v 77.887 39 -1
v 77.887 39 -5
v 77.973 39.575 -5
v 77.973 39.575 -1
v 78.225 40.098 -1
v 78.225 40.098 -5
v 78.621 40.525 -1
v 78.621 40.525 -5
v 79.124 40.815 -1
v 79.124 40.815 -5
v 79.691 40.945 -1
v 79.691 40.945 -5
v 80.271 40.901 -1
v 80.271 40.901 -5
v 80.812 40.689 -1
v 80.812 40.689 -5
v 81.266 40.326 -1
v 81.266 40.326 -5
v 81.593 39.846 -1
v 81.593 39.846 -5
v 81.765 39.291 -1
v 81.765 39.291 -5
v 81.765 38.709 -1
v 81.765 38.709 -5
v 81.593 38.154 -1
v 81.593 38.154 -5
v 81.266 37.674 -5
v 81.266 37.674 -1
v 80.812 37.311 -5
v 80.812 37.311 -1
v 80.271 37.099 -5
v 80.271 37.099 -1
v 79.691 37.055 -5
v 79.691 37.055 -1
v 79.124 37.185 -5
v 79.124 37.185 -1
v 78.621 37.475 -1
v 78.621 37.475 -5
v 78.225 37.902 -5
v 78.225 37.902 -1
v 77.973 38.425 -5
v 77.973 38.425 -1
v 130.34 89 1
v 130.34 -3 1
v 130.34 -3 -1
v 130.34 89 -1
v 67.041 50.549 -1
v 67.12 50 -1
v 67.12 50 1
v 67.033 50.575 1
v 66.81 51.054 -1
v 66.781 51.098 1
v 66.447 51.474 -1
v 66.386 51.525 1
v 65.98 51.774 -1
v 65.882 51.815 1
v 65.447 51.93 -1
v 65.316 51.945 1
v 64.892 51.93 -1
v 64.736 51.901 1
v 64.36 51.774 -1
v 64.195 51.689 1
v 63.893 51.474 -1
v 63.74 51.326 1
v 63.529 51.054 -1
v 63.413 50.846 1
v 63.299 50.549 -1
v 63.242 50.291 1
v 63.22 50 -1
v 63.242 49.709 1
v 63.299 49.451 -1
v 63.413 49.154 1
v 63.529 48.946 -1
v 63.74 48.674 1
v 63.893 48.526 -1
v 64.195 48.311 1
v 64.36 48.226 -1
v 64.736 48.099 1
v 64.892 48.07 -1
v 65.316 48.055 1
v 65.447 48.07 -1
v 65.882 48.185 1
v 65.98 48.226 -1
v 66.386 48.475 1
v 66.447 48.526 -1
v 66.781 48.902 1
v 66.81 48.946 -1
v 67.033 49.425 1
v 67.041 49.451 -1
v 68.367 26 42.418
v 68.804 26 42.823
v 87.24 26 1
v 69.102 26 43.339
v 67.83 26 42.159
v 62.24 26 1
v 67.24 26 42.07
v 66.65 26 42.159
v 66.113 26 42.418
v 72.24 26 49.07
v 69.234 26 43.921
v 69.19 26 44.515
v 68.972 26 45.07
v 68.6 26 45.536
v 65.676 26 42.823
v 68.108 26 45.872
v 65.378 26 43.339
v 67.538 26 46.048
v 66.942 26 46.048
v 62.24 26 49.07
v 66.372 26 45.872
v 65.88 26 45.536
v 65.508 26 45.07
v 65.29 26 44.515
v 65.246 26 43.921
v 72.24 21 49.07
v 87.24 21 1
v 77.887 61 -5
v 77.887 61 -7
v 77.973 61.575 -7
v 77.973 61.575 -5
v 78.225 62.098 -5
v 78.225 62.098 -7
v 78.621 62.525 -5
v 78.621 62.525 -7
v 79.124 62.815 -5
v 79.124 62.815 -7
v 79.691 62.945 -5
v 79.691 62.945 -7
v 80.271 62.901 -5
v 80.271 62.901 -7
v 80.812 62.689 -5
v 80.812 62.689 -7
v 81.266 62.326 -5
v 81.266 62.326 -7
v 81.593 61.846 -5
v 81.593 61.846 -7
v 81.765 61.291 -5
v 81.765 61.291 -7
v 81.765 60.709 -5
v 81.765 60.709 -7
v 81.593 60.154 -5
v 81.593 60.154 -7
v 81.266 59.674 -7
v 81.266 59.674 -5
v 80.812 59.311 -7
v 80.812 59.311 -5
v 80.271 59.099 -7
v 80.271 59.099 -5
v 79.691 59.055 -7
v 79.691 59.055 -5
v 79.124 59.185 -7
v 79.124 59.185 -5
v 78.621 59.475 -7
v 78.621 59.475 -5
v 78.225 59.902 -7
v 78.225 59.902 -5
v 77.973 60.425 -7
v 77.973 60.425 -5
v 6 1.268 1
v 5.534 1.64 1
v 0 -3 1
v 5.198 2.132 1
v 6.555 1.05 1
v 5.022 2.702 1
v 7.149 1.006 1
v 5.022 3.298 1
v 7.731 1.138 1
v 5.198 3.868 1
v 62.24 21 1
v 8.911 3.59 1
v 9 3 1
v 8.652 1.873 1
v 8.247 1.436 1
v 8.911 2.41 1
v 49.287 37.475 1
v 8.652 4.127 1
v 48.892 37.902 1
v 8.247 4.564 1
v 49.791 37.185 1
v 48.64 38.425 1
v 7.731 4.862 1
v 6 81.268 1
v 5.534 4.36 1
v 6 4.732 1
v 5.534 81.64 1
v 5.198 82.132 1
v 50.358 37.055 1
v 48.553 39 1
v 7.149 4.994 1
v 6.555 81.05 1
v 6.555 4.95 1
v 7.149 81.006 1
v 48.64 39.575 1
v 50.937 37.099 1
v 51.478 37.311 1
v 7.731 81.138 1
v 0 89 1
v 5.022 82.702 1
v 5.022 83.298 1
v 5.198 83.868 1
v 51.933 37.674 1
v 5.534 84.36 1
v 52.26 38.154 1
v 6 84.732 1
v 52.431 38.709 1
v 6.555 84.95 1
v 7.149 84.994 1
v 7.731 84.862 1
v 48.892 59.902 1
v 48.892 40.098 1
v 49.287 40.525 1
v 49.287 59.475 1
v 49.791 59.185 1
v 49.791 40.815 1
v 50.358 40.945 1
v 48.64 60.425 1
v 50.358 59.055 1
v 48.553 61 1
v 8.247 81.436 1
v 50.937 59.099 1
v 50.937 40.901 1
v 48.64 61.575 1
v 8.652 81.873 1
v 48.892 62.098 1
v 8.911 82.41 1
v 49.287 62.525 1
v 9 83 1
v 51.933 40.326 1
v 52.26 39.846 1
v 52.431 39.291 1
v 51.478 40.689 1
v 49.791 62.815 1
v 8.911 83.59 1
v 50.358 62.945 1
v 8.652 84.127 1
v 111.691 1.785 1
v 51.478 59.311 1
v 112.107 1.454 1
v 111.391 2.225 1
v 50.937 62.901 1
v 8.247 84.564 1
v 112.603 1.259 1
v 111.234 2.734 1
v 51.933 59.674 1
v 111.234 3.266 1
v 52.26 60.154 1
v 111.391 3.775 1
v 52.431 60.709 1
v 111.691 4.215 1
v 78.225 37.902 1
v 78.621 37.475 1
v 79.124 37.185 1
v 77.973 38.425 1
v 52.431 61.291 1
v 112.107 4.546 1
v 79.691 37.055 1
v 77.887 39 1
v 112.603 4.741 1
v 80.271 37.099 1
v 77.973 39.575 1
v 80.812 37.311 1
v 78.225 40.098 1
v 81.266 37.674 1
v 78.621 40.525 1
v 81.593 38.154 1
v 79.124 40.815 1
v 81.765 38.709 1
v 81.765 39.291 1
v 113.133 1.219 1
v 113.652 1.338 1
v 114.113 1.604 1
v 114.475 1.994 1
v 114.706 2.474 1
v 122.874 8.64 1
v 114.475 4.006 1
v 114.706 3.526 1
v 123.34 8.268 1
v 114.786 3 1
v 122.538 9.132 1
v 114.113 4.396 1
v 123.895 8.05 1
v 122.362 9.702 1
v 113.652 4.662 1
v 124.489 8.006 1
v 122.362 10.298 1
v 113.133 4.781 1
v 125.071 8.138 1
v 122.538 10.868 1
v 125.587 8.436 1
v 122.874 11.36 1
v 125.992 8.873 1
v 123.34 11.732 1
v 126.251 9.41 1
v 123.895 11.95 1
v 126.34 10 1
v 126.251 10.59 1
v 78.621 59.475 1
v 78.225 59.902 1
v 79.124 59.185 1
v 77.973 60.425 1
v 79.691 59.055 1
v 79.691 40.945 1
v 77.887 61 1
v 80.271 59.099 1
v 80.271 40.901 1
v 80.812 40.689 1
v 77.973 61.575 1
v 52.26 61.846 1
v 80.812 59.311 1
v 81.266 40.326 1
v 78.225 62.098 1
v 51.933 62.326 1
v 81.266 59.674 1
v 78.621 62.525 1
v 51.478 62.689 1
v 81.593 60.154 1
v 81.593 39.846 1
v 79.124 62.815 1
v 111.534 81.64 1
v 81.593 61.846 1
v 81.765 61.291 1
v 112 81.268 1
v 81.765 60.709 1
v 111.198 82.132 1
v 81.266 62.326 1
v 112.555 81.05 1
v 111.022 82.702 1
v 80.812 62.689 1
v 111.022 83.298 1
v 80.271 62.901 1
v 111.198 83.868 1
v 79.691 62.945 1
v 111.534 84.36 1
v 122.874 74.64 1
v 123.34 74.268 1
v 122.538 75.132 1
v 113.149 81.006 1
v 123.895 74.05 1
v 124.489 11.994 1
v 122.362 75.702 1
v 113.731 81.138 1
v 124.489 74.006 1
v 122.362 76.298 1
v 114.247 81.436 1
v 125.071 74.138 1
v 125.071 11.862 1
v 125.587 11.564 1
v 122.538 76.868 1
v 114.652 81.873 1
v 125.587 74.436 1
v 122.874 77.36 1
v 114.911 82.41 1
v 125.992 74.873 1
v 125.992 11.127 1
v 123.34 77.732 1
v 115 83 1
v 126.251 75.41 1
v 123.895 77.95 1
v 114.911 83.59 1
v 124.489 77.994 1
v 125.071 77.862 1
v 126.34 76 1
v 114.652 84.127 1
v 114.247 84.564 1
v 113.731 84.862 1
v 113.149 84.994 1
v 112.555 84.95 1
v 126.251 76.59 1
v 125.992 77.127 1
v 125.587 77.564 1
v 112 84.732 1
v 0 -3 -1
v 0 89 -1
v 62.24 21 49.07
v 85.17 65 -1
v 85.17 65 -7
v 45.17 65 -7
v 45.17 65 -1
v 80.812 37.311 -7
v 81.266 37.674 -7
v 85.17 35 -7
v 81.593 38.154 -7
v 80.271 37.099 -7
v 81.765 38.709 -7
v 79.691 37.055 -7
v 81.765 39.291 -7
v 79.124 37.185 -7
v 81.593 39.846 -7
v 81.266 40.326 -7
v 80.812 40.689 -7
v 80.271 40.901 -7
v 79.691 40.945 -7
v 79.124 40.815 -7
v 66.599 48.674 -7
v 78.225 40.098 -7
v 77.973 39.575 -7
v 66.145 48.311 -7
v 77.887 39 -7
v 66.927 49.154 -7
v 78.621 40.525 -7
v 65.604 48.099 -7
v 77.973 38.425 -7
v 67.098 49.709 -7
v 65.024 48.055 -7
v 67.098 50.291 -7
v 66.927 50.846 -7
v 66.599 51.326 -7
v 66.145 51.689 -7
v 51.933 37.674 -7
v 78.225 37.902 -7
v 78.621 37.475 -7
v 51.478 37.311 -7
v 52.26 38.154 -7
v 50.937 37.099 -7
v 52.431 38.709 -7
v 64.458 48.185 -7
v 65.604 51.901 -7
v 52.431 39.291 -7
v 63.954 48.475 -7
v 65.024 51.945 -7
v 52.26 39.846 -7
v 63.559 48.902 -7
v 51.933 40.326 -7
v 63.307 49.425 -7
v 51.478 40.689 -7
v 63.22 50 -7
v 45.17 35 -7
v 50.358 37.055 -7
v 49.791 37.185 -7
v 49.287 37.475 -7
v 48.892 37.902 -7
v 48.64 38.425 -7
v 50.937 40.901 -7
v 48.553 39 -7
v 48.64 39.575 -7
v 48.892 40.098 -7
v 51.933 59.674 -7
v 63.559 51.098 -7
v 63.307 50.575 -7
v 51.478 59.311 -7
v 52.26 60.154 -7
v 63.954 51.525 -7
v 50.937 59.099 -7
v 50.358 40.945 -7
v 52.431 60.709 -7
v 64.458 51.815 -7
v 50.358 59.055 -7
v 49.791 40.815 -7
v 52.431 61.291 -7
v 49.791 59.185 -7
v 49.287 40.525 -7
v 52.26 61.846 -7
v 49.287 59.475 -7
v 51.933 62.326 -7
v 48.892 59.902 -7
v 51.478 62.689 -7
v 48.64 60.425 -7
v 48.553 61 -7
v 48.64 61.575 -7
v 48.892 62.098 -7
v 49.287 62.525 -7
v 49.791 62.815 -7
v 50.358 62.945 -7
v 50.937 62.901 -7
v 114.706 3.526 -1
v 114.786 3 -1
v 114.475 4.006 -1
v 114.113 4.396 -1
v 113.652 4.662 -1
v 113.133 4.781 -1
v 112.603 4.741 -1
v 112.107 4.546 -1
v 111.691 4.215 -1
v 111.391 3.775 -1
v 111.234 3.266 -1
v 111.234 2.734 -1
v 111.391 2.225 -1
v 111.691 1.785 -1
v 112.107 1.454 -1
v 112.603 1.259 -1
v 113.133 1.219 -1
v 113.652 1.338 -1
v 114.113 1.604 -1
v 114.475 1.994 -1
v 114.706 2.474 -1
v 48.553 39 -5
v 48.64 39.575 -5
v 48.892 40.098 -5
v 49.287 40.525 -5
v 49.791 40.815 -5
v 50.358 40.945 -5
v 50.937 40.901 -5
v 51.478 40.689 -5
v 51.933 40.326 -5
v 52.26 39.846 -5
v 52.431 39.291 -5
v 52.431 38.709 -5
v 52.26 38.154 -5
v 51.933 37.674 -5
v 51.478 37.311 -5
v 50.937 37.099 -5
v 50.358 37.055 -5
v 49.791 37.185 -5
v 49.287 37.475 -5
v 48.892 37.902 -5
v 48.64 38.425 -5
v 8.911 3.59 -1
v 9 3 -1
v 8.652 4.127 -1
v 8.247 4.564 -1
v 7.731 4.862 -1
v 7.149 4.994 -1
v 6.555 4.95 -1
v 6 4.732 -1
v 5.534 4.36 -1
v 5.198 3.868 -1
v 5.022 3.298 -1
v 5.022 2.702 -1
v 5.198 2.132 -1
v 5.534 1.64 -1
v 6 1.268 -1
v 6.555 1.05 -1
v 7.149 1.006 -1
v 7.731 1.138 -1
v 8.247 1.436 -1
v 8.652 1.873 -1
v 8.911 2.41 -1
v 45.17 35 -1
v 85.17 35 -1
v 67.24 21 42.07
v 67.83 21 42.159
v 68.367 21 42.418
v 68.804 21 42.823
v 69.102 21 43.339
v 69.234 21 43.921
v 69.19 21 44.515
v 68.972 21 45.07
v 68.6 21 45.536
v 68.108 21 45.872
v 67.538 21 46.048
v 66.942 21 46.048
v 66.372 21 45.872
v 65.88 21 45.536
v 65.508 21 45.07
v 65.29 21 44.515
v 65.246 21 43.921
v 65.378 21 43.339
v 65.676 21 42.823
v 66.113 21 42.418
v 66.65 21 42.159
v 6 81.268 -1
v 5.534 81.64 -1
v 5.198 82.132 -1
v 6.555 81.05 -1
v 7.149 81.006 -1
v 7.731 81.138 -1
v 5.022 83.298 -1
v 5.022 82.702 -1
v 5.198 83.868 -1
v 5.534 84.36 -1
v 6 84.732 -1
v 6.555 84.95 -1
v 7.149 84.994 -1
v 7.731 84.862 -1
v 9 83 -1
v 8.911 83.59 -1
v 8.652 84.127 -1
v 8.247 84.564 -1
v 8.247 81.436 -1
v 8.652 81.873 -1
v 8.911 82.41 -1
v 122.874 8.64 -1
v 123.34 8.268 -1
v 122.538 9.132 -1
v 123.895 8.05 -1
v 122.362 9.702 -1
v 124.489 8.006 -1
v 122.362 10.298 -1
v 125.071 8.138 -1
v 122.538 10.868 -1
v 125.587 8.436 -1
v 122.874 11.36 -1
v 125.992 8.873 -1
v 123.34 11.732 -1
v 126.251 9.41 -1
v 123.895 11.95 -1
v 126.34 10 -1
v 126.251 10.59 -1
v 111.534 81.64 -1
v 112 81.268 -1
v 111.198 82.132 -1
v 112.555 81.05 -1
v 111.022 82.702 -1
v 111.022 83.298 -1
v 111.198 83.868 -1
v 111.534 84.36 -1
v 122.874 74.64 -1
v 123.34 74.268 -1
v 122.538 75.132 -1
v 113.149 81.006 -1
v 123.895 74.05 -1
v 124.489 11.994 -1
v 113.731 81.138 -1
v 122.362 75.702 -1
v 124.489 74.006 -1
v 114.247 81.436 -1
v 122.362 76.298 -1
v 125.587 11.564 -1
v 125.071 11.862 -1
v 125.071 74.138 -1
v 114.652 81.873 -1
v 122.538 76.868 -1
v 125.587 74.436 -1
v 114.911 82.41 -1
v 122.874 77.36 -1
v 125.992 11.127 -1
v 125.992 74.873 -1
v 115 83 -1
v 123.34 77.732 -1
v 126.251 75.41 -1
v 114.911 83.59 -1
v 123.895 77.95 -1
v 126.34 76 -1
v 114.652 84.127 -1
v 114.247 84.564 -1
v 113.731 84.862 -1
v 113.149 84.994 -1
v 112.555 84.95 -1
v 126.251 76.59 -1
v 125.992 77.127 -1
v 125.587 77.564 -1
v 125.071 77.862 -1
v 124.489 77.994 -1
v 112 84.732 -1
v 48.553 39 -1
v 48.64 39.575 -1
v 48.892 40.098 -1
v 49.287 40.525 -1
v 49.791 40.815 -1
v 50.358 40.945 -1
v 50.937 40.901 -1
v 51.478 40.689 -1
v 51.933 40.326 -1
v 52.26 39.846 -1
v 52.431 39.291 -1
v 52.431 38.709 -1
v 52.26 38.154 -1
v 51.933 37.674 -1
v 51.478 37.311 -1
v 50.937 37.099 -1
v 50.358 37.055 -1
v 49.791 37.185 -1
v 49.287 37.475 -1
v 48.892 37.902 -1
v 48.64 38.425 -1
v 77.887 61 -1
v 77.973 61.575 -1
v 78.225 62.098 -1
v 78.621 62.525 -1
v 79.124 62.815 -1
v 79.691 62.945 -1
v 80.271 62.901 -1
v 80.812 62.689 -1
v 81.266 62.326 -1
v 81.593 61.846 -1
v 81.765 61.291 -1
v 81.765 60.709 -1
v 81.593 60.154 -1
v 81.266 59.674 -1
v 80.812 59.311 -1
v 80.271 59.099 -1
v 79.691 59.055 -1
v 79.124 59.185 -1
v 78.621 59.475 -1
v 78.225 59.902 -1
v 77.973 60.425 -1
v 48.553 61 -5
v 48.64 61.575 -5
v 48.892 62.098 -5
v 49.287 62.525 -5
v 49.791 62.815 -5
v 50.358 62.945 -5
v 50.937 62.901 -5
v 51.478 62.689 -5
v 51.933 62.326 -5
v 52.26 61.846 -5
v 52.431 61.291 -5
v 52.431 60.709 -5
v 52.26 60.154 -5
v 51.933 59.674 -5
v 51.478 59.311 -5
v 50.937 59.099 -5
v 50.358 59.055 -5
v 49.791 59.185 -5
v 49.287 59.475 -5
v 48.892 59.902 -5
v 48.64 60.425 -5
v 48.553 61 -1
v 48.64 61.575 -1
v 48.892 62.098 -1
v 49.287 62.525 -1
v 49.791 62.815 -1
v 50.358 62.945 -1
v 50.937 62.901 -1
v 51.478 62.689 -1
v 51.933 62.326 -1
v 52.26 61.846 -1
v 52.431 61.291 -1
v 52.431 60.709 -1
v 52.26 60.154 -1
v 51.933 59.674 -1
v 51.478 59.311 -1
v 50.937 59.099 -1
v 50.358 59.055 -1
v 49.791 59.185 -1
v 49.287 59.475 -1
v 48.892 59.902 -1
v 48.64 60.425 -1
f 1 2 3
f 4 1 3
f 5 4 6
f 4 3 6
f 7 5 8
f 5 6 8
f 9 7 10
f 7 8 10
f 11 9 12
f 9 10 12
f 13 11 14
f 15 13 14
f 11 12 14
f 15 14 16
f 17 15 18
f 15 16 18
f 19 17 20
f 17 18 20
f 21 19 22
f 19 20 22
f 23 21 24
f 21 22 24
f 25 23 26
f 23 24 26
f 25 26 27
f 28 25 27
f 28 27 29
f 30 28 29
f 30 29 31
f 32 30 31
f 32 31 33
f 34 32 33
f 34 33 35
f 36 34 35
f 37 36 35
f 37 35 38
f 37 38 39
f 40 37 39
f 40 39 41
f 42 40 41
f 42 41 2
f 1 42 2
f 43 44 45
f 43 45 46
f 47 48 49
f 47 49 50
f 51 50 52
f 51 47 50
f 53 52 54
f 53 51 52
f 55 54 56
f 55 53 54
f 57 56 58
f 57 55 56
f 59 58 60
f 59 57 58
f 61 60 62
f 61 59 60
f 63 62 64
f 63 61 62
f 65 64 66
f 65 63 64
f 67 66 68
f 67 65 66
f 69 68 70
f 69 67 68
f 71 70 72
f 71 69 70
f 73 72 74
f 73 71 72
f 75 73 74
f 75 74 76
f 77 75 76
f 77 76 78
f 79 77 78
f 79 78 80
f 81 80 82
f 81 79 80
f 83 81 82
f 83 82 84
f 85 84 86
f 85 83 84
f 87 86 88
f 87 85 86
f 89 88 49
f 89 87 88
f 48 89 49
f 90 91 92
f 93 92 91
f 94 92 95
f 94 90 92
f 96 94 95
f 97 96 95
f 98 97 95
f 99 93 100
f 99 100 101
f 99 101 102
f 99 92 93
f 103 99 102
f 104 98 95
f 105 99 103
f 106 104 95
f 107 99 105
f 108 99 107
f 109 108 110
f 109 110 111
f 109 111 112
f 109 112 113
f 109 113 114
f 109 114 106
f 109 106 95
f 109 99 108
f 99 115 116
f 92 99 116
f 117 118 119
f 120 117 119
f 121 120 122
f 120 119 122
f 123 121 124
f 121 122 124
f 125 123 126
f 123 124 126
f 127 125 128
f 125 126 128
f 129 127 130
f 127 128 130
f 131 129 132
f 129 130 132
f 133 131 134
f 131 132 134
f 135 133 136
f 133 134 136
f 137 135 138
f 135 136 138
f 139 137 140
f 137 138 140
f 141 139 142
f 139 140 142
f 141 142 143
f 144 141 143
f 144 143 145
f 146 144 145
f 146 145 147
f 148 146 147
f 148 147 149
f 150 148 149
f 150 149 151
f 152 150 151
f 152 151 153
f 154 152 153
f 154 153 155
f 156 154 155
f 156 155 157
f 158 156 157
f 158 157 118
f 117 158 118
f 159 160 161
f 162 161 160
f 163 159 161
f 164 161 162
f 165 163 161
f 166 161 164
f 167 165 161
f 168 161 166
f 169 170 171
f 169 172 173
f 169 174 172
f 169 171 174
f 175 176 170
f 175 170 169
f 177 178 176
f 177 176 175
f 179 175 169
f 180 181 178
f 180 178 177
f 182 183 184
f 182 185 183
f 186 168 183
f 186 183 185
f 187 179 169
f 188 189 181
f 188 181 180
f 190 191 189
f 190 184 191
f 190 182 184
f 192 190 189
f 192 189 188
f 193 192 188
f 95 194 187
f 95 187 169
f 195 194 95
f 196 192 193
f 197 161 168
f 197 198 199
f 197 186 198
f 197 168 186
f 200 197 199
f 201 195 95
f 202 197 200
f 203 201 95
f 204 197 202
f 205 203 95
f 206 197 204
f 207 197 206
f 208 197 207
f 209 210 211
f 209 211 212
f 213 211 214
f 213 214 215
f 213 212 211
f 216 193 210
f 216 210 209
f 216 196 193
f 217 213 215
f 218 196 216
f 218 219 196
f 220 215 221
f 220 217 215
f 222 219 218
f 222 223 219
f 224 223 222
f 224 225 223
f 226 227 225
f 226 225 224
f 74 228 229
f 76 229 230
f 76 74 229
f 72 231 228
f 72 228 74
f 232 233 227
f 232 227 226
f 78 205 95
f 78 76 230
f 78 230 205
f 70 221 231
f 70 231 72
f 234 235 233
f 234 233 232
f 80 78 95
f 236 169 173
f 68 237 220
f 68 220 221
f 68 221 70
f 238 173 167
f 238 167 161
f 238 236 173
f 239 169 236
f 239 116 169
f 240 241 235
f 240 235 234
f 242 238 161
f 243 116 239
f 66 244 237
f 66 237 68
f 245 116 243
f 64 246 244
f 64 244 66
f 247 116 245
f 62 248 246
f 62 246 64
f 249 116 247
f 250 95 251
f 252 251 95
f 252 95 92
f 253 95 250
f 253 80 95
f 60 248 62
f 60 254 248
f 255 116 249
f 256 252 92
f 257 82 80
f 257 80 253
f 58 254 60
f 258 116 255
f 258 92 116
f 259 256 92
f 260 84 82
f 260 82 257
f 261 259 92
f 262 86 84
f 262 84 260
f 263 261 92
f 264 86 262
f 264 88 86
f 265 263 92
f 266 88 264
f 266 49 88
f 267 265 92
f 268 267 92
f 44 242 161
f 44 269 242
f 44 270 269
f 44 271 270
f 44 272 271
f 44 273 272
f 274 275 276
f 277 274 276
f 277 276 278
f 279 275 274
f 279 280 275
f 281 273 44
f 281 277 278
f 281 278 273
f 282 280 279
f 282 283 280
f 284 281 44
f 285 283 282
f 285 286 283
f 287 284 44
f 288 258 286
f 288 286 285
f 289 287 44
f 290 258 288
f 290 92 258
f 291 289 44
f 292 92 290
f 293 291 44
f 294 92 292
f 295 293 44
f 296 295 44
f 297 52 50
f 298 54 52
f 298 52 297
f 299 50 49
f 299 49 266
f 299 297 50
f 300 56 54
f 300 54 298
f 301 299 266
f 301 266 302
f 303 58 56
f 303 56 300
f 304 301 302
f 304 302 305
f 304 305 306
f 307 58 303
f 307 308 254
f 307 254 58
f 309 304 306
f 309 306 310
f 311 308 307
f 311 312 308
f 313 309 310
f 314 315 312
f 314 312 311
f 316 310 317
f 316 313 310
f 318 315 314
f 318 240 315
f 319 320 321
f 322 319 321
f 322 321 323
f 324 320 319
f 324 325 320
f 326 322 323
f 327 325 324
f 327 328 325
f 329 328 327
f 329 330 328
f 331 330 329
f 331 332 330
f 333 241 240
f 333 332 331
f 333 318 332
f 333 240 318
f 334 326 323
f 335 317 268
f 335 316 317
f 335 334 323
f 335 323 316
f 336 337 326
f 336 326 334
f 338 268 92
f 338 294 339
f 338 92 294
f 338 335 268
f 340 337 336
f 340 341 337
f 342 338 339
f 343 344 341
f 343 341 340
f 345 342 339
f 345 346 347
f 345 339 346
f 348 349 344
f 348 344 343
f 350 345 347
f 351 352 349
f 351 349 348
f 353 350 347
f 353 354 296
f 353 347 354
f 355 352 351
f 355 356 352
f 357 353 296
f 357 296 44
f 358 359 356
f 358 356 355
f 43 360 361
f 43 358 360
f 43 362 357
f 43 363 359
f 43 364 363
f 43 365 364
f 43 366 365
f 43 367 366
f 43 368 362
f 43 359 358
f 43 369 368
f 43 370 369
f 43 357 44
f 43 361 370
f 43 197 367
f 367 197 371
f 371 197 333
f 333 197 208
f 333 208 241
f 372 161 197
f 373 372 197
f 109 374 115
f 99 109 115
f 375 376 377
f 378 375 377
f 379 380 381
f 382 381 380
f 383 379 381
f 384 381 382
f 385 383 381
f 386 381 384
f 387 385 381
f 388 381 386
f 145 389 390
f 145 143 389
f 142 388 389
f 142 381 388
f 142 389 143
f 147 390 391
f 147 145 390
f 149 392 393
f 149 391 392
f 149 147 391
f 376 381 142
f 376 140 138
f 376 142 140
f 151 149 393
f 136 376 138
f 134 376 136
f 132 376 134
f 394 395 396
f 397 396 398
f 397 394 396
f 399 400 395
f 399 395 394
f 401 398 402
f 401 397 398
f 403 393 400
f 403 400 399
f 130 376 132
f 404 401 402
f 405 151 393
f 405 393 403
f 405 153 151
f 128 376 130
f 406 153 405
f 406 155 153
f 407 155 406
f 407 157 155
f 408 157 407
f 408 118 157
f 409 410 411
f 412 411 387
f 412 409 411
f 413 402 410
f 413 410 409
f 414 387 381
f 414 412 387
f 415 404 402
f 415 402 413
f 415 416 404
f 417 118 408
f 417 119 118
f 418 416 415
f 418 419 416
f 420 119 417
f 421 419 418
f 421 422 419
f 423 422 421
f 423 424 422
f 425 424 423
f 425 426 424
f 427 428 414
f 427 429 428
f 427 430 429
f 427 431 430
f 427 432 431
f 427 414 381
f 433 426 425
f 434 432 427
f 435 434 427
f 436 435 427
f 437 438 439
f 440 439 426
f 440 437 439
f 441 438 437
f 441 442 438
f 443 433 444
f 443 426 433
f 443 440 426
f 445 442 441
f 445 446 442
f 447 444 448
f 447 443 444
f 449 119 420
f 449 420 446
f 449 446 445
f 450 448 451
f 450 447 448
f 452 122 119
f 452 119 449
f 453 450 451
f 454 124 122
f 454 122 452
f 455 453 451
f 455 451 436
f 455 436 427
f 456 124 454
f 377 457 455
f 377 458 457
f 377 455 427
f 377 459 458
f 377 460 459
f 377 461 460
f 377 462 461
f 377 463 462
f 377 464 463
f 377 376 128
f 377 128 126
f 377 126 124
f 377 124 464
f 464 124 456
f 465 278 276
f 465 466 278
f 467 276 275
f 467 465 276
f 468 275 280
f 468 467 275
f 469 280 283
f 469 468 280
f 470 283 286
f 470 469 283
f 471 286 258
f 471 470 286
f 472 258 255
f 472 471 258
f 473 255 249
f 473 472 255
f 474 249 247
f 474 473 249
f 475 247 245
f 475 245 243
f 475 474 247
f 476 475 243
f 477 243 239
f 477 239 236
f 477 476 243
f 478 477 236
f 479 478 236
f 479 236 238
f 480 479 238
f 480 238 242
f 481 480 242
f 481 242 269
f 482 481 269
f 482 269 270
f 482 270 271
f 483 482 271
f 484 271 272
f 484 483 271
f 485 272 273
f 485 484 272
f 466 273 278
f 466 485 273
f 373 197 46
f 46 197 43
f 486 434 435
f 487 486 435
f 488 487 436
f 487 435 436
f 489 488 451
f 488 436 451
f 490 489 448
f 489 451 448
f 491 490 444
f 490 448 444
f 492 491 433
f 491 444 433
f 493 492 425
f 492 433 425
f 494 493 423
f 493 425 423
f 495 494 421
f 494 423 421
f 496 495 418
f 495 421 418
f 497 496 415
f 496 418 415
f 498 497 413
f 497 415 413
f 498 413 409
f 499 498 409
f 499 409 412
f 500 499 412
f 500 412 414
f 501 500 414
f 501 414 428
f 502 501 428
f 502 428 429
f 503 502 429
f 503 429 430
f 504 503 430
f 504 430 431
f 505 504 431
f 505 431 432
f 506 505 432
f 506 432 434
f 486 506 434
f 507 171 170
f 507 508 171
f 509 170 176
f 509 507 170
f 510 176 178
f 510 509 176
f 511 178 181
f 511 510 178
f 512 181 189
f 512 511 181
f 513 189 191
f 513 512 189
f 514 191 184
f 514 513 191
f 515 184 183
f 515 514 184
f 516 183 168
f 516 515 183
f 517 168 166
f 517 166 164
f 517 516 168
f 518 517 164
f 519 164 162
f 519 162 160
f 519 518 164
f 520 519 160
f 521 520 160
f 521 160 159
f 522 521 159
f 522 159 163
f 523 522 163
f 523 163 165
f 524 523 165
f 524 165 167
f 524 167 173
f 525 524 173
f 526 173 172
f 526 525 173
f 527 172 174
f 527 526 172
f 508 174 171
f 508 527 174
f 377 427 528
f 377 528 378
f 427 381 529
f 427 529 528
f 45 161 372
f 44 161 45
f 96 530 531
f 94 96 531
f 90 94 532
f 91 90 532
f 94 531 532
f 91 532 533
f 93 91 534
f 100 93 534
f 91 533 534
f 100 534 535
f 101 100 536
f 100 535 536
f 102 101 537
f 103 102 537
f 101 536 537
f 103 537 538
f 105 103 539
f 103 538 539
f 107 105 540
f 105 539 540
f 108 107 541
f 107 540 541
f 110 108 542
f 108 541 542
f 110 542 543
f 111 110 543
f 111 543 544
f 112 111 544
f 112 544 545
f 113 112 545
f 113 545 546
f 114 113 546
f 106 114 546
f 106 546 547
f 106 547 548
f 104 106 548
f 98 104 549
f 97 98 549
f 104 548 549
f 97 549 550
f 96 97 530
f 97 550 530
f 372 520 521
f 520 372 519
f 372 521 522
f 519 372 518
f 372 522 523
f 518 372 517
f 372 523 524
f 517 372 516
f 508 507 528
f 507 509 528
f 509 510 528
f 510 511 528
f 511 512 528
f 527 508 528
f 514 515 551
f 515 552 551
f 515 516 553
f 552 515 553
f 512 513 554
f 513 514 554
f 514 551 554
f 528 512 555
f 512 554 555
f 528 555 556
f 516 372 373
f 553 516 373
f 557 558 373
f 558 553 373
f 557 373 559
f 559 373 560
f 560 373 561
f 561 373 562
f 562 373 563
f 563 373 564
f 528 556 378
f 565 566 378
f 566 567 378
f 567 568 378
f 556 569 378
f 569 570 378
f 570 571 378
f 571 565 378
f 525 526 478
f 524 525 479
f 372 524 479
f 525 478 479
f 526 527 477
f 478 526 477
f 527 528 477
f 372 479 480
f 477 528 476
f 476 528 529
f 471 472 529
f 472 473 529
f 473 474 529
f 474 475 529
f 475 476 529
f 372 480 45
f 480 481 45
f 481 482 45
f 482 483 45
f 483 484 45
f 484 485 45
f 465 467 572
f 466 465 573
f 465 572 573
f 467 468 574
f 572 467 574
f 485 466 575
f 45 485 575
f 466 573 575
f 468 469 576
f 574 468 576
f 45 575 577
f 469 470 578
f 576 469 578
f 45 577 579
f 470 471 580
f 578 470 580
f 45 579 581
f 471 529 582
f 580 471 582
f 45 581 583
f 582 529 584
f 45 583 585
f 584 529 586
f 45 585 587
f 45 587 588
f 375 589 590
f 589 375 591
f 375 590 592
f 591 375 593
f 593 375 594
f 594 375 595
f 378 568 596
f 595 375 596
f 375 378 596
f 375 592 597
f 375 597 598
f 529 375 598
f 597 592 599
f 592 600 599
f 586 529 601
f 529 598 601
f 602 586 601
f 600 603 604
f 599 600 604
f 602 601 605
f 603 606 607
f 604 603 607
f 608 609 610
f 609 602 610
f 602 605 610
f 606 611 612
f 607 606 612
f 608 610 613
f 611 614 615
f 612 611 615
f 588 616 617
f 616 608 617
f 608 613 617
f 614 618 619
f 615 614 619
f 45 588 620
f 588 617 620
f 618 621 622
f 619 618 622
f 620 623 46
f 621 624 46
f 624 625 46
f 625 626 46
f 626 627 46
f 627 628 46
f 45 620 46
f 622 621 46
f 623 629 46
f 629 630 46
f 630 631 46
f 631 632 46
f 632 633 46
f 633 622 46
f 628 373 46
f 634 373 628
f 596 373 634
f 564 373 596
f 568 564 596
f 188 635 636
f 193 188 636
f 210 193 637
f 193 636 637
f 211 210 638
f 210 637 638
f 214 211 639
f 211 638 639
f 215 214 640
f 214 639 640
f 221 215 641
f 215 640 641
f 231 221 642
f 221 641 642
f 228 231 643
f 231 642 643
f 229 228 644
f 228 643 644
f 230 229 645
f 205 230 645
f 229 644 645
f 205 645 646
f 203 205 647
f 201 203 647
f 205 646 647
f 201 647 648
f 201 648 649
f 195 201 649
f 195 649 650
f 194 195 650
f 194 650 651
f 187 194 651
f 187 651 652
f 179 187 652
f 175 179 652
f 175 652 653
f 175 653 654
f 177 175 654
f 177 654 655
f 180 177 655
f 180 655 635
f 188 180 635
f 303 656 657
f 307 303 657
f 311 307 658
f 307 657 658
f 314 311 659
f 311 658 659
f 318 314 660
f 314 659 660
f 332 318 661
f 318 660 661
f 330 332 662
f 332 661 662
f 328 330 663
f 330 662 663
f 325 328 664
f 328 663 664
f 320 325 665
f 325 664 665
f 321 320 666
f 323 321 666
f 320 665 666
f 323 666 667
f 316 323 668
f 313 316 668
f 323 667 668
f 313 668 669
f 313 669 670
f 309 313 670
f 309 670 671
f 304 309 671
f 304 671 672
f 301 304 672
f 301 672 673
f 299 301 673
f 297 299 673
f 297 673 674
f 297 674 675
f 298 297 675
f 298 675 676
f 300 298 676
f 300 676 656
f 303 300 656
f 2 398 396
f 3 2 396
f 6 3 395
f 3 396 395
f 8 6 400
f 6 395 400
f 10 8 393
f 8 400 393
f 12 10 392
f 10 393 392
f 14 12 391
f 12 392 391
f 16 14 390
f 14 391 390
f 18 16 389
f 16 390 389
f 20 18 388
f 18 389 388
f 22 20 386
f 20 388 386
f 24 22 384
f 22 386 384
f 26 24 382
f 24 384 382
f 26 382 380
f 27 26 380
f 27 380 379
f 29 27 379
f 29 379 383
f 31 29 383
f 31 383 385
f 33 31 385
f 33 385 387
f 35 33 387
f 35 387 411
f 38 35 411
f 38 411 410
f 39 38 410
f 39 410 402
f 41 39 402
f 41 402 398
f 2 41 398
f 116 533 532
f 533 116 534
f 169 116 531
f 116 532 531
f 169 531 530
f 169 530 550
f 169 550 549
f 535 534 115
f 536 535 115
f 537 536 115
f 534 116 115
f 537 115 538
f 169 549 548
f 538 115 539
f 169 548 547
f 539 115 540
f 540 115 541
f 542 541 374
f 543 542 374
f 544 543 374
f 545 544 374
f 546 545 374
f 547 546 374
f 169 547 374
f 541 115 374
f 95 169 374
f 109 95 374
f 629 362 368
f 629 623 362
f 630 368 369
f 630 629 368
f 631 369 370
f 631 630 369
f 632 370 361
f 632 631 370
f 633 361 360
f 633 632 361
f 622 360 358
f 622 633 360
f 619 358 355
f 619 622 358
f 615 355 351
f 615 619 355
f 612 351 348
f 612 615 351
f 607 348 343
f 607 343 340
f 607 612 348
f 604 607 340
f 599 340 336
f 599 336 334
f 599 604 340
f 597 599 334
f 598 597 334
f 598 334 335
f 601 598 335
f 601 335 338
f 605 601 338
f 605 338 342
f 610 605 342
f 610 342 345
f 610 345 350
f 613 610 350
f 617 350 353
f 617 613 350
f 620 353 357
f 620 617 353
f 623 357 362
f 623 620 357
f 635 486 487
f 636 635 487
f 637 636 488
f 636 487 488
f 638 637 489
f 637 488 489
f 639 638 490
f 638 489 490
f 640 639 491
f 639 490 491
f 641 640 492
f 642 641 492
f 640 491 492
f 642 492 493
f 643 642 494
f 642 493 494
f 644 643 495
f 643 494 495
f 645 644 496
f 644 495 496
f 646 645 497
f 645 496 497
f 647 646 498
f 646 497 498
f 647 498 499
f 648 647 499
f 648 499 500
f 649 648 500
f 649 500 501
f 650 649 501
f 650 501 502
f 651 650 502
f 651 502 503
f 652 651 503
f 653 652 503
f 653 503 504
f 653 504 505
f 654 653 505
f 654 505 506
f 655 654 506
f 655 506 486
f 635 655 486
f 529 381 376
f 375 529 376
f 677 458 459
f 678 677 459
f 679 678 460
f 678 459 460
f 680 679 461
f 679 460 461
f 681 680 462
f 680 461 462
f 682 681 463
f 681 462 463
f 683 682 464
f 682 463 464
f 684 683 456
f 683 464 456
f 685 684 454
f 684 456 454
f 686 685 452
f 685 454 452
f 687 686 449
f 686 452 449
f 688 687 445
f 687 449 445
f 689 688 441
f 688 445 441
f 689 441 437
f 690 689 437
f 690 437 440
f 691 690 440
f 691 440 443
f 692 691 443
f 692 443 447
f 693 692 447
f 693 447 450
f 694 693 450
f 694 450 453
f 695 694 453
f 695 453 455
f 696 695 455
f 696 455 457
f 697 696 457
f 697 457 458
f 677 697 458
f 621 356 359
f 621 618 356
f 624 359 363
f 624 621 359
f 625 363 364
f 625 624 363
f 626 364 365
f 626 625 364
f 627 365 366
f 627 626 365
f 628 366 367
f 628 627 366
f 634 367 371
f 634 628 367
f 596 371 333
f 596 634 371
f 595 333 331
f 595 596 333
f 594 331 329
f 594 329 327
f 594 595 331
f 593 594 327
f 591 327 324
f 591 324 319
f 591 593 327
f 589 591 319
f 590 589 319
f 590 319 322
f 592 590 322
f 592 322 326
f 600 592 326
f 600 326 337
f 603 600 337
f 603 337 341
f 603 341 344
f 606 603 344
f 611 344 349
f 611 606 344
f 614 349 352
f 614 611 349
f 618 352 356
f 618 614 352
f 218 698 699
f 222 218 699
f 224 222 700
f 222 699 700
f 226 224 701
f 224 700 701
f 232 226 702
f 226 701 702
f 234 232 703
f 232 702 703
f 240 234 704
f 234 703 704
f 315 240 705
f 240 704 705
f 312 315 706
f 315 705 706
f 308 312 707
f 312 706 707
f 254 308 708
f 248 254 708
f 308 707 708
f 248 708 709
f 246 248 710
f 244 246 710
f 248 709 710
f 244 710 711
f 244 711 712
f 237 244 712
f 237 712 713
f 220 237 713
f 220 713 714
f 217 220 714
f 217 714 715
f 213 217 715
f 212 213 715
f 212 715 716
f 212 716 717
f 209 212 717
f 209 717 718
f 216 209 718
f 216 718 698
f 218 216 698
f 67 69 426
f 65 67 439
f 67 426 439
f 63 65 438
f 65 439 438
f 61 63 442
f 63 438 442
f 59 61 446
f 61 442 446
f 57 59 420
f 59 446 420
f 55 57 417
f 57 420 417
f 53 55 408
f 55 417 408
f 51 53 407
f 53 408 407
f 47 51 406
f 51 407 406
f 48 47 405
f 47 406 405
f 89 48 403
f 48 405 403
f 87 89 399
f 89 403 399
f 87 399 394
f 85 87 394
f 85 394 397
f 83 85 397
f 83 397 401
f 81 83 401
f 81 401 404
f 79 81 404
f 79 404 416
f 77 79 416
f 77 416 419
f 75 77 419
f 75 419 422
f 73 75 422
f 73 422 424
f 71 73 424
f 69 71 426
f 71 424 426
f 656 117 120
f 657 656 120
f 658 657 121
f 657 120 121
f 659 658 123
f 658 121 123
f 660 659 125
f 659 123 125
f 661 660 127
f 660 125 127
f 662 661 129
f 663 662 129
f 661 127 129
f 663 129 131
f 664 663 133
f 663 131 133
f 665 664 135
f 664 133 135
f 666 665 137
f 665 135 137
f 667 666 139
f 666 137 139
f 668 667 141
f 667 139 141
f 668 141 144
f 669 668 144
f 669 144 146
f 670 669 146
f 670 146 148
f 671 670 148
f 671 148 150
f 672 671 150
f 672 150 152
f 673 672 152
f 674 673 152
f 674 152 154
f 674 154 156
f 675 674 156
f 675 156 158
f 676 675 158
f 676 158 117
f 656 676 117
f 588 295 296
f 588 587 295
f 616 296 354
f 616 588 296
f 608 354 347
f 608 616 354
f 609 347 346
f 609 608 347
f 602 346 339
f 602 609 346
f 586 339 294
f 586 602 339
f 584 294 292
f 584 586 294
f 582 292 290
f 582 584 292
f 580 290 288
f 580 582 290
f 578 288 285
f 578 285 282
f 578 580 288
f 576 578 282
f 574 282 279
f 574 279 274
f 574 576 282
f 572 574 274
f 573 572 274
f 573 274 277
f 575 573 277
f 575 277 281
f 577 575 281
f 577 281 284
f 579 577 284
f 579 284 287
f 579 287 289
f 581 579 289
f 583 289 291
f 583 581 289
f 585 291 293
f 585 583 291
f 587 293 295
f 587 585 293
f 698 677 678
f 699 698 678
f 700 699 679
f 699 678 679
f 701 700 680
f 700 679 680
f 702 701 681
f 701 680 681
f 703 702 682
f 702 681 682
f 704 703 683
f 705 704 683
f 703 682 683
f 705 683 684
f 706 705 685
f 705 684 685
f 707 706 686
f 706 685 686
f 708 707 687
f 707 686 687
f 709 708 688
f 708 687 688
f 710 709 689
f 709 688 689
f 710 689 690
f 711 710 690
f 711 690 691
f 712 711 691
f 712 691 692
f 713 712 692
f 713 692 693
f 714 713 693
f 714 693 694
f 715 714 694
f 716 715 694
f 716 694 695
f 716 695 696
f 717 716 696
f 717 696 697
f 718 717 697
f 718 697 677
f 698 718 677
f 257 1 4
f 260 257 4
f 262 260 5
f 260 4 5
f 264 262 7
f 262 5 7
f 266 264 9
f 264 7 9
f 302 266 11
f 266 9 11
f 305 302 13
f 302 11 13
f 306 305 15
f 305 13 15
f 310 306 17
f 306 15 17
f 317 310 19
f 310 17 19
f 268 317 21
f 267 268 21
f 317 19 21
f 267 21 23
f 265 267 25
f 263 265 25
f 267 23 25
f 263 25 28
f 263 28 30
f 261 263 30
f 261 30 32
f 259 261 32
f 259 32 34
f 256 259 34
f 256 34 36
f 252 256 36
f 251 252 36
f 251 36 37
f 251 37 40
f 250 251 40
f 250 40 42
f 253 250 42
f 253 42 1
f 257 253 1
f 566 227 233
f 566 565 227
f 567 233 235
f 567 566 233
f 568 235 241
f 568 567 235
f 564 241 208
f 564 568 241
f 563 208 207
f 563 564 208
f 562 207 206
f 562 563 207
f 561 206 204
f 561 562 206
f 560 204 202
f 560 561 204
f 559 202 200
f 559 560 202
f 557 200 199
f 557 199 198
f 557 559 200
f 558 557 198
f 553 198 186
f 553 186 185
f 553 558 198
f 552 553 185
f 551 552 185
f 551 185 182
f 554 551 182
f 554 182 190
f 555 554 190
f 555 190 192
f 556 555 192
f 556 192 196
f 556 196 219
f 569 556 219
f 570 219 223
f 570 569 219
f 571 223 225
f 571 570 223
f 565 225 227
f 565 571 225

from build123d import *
from build123d.topology import SkipClean

# Parameters (mm, degrees)
SKETCH_1_W          = 130.33985981
SKETCH_1_H          = 92
SKETCH_1_R          = 2
SKETCH_1_R_2        = 1.785582523
SKETCH_1_R_3        = 1.95
EXTRUDE_1_DEPTH     = 1
EXTRUDE_START       = -24
SKETCH_2_R          = 2
EXTRUDE_2_DEPTH     = 5
EXTRUDE_START_2     = 6
SKETCH_3_W          = 40
SKETCH_3_H          = 30
SKETCH_3_R          = 1.95
EXTRUDE_3_DEPTH     = 6
CUT_EXTRUDE_START   = 4
SKETCH_5_R          = 1.95
CUT_EXTRUDE_3_DEPTH = 6


with BuildPart() as part:
    # 草图1 → 凸台-拉伸1 (new, symmetric)
    with BuildSketch(Plane.XY):
        with Locations((65.169929905, 43)):
            Rectangle(SKETCH_1_W, SKETCH_1_H)
        with Locations((124.33985981, 10)):
            Circle(SKETCH_1_R, mode=Mode.SUBTRACT)
        with Locations((124.33985981, 76)):
            Circle(SKETCH_1_R, mode=Mode.SUBTRACT)
        with Locations((7, 3)):
            Circle(SKETCH_1_R, mode=Mode.SUBTRACT)
        with Locations((113, 3)):
            Circle(SKETCH_1_R_2, mode=Mode.SUBTRACT)
        with Locations((7, 83)):
            Circle(SKETCH_1_R, mode=Mode.SUBTRACT)
        with Locations((113, 83)):
            Circle(SKETCH_1_R, mode=Mode.SUBTRACT)
        with Locations((65.169929905, 50)):
            Circle(SKETCH_1_R_3, mode=Mode.SUBTRACT)
    extrude(amount=EXTRUDE_1_DEPTH, both=True)

    # 草图2 → 凸台-拉伸2 (add)
    with BuildSketch(Plane.XZ.offset(3).offset(EXTRUDE_START)):
        Polygon((62.24, 49.07), (72.24, 49.07), (87.24, 1), (62.24, 1), align=None)
        with Locations(Location((67.24, 44.07, 0), (0, 0, 270))):
            Circle(SKETCH_2_R, mode=Mode.SUBTRACT)
    extrude(amount=-EXTRUDE_2_DEPTH)

    # 草图3 → 凸台-拉伸3 (add)
    with SkipClean():  # the faces are left unmerged after this step: merging them gives an invalid solid
        with BuildSketch(Plane(origin=(0, 0, -1), x_dir=(-1, 0, 0), z_dir=(0, 0, -1)).offset(EXTRUDE_START_2)):
            with Locations((-65.169929905, 50)):
                Rectangle(SKETCH_3_W, SKETCH_3_H)
            with Locations((-79.836596572, 61)):
                Circle(SKETCH_3_R, mode=Mode.SUBTRACT)
            with Locations((-50.503263238, 61)):
                Circle(SKETCH_3_R, mode=Mode.SUBTRACT)
            with Locations((-50.503263238, 39)):
                Circle(SKETCH_3_R, mode=Mode.SUBTRACT)
            with Locations((-79.836596572, 39)):
                Circle(SKETCH_3_R, mode=Mode.SUBTRACT)
            with Locations((-65.169929905, 50)):
                Circle(SKETCH_3_R, mode=Mode.SUBTRACT)
        extrude(amount=-EXTRUDE_3_DEPTH)

    # 草图5 → 切除-拉伸3 (cut)
    with SkipClean():  # the faces are left unmerged after this step: merging them gives an invalid solid
        with BuildSketch(Plane(origin=(0, 0, -1), x_dir=(-1, 0, 0), z_dir=(0, 0, -1)).offset(CUT_EXTRUDE_START)):
            with Locations((-50.503263238, 39)):
                Circle(SKETCH_5_R)
            with Locations((-79.836596572, 39)):
                Circle(SKETCH_5_R)
            with Locations((-79.836596572, 61)):
                Circle(SKETCH_5_R)
            with Locations((-50.503263238, 61)):
                Circle(SKETCH_5_R)
        extrude(amount=-CUT_EXTRUDE_3_DEPTH, mode=Mode.SUBTRACT)


solid = part.part
